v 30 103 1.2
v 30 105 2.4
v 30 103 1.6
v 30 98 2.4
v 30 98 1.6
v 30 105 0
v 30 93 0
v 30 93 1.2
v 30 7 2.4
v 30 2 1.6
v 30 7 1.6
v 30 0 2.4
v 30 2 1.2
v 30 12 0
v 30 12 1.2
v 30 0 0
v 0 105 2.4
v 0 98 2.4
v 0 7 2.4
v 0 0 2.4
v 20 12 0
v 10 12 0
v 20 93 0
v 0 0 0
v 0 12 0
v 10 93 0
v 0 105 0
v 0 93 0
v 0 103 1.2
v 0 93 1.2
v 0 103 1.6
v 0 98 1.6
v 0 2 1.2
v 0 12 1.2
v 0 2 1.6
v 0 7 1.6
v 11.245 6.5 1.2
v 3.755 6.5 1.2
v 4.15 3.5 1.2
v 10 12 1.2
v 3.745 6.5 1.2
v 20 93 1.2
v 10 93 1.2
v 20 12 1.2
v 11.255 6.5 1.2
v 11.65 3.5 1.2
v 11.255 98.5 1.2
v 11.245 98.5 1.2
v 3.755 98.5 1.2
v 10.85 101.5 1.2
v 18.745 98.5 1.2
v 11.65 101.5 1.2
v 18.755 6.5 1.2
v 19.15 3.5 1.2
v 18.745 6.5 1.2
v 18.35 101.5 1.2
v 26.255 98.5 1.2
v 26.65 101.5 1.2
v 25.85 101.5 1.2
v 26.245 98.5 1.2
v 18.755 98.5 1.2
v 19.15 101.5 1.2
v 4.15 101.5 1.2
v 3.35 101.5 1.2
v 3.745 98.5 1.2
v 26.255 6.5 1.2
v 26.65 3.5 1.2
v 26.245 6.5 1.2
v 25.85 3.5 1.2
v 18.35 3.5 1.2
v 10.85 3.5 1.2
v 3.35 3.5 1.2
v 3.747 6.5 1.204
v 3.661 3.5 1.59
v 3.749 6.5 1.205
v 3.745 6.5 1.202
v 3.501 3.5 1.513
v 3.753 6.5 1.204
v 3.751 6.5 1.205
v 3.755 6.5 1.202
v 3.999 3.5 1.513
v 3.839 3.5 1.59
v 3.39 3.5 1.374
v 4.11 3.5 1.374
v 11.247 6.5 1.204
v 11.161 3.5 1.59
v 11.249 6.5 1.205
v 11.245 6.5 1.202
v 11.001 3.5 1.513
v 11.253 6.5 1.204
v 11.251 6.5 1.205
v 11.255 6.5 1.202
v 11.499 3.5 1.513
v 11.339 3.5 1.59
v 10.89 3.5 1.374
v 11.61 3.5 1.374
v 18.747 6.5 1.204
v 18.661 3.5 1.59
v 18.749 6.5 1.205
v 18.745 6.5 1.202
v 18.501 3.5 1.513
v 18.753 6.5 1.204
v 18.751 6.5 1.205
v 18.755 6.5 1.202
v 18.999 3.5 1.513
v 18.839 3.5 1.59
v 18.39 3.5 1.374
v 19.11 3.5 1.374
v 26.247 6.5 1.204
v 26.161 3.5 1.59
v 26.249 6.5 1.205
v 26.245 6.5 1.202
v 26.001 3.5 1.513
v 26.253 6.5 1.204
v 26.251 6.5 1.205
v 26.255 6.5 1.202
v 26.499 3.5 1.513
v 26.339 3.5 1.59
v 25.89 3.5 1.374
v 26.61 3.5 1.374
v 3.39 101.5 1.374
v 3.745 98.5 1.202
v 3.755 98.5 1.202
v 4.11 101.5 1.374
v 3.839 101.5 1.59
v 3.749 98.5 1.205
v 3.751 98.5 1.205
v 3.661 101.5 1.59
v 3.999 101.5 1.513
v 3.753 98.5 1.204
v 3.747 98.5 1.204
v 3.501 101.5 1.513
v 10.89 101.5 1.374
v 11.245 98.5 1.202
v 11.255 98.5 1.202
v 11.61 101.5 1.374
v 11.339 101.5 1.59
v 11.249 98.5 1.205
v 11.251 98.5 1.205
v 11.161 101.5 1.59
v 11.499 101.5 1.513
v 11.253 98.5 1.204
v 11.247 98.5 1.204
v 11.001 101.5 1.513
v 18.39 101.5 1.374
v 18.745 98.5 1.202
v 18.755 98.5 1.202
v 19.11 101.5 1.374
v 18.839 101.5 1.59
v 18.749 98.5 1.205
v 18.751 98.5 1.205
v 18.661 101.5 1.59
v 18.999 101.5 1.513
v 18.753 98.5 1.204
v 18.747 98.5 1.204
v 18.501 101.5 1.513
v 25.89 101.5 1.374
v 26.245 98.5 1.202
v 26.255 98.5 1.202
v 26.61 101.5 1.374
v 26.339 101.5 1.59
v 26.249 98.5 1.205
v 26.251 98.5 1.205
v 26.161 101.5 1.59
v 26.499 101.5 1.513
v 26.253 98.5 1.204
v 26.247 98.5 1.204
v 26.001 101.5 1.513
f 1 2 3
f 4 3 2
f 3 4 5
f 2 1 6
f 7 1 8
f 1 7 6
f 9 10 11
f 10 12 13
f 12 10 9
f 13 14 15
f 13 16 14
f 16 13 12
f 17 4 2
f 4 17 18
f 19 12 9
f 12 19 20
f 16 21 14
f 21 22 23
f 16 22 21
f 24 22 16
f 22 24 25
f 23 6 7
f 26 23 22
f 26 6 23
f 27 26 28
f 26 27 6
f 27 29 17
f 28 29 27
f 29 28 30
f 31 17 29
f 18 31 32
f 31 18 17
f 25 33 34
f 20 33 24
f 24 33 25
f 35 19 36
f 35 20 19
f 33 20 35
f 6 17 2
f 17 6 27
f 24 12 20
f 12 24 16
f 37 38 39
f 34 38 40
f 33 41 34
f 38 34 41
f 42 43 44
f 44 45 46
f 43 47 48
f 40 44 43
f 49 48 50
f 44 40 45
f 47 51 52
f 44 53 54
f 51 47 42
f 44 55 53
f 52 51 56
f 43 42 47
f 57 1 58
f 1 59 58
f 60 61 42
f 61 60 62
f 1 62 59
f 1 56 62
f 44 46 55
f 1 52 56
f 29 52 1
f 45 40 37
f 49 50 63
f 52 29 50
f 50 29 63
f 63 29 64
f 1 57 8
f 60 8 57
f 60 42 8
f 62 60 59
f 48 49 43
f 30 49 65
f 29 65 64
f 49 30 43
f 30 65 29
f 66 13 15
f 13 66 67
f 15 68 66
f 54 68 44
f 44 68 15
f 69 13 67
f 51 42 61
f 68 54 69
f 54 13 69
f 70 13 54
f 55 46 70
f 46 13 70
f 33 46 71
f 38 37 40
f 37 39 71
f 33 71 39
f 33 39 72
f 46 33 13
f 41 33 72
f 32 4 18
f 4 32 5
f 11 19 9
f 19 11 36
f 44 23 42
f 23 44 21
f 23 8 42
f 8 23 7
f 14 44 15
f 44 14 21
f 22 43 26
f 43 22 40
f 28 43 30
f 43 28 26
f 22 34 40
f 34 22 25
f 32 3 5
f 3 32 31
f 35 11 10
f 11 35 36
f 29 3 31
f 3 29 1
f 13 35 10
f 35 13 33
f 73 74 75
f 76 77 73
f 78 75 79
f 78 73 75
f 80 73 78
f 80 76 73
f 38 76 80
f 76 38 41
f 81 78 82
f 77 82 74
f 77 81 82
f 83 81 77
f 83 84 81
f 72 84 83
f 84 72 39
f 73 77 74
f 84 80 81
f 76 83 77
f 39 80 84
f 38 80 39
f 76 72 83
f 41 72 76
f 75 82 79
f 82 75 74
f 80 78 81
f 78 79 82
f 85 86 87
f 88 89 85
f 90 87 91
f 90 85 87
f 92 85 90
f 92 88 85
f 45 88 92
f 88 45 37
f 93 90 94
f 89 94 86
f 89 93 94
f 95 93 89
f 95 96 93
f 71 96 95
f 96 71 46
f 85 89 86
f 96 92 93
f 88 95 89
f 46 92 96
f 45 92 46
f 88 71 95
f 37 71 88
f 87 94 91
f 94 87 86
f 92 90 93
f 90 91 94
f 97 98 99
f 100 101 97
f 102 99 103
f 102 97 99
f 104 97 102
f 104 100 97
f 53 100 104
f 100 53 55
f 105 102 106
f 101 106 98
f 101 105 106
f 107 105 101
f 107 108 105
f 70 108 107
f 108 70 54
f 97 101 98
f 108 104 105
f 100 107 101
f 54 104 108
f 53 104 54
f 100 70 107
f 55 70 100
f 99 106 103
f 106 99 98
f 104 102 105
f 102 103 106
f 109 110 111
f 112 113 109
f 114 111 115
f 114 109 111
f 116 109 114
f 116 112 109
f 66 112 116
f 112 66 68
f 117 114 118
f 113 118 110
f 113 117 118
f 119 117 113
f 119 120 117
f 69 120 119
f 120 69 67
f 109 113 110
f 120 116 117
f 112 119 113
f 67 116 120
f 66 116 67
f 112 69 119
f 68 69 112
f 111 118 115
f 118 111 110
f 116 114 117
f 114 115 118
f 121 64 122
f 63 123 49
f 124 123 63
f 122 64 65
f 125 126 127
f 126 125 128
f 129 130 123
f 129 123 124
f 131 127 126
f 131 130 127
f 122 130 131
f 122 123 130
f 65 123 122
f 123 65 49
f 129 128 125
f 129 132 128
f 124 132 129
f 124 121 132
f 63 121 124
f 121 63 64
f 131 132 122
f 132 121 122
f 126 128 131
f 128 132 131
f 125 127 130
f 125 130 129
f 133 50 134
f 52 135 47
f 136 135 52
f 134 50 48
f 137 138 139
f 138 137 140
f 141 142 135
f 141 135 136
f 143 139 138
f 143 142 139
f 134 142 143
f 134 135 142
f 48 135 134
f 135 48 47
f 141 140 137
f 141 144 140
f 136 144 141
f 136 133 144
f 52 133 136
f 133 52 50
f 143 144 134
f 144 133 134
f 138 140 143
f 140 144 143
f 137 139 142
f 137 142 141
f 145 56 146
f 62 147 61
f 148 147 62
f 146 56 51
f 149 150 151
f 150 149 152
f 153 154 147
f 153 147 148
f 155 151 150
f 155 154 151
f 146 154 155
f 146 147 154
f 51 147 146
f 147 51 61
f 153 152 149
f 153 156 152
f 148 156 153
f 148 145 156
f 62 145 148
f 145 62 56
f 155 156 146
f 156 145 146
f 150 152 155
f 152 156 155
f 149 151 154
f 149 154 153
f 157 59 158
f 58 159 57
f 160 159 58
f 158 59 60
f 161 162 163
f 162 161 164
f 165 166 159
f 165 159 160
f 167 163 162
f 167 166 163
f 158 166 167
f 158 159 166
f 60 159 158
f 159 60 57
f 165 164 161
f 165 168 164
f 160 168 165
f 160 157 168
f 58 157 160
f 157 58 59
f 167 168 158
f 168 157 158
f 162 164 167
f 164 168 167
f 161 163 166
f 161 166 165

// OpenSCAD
/*
    Top - down frame holder
 */


hrubkaVrstvy = 0.20;

sirka = 30;
vyska = 101;
hrubka = 12*hrubkaVrstvy;

hrubkaZadnaStena = 6*hrubkaVrstvy;
hrubkaVyrezPreObrazok = 2*hrubkaVrstvy;

sirkaListaStred = 10;

// kolko pridat na kazdej strane na vysku (extra k vyske obrazku)
vyskaExtra = 2;
prekrytieObrazku = 5;

// pocet trnov na upevnenie obrazku
pocetTrnov = 4;



module baseFrame() {
    difference() {
        cube([sirka, vyska+2*vyskaExtra, hrubka]);
        
        translate([0,vyskaExtra+prekrytieObrazku,hrubkaZadnaStena]) cube([sirka, vyska-2*prekrytieObrazku, hrubka]);
        
        translate([sirka/2+sirkaListaStred/2,vyskaExtra+prekrytieObrazku+5,0]) cube([sirka, vyska-2*prekrytieObrazku-10, hrubka]);

        translate([-sirka/2-sirkaListaStred/2,vyskaExtra+prekrytieObrazku+5,0]) cube([sirka, vyska-2*prekrytieObrazku-10, hrubka]);
        
        translate([0,vyskaExtra,hrubkaZadnaStena]) cube([sirka, vyska, hrubkaVyrezPreObrazok]);
        
    }
}

$fn = 14;

union() {
    baseFrame();
    
    rozpatie = sirka/pocetTrnov;
    
    for (i = [0:1:pocetTrnov-1]) {
    #translate([i*rozpatie+rozpatie/2,vyskaExtra+1.5,hrubkaZadnaStena]) rotate([-90,0,0]) cylinder(h=3, d1=0.8, d2=0.01);
    }

    for (i = [0:1:pocetTrnov-1]) {
     #translate([i*rozpatie+rozpatie/2,vyska+vyskaExtra-1.5,hrubkaZadnaStena]) rotate([90,0,0]) cylinder(h=3, d1=0.8, d2=0.01);
    }
}
